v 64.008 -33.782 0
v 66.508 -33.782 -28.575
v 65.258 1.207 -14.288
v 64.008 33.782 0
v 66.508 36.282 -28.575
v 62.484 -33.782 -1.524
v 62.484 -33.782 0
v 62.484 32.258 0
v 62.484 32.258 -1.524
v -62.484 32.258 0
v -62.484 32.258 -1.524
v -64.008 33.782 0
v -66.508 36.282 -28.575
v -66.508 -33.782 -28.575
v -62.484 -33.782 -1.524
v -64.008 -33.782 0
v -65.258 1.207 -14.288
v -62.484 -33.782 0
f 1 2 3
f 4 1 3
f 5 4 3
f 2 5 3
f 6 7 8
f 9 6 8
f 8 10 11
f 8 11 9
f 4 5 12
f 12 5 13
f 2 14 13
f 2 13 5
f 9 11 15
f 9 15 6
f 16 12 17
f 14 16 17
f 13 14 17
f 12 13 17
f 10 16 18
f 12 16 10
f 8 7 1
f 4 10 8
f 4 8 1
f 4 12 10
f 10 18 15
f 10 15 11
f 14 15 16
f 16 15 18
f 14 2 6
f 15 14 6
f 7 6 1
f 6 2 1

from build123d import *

# Parameters (mm, degrees)
F0_W          = 128.016
F0_H          = 67.564
F1_DEPTH      = 28.575
F1_TAPER      = -5
F2_W          = 2.4999885603
F2_H          = 28.575
F3_DEPTH      = 66.5089886603
F3_DEPTH_BACK = 66.5089886603
F4_W          = 124.968
F4_H          = 66.04
F5_DEPTH      = 1.524


with BuildPart() as f1:
    # F0 (on Top) → F1 (new body)
    with BuildSketch(Plane.XY):
        Rectangle(F0_W, F0_H)
    extrude(amount=-F1_DEPTH, taper=F1_TAPER)

    # F2 (on Right) → F3 (cut, two sides)
    with BuildSketch(Plane.YZ) as f3_sk:
        with Locations((-35.0319942801, -14.2875)):
            Rectangle(F2_W, F2_H)
    extrude(amount=-F3_DEPTH, mode=Mode.SUBTRACT)
    extrude(f3_sk.sketch, amount=F3_DEPTH_BACK, mode=Mode.SUBTRACT)

    # F4 (on face) → F5 (cut)
    with BuildSketch(Plane.XY):
        with Locations((0, -0.762)):
            Rectangle(F4_W, F4_H)
    extrude(amount=-F5_DEPTH, mode=Mode.SUBTRACT)


solid = f1.part
